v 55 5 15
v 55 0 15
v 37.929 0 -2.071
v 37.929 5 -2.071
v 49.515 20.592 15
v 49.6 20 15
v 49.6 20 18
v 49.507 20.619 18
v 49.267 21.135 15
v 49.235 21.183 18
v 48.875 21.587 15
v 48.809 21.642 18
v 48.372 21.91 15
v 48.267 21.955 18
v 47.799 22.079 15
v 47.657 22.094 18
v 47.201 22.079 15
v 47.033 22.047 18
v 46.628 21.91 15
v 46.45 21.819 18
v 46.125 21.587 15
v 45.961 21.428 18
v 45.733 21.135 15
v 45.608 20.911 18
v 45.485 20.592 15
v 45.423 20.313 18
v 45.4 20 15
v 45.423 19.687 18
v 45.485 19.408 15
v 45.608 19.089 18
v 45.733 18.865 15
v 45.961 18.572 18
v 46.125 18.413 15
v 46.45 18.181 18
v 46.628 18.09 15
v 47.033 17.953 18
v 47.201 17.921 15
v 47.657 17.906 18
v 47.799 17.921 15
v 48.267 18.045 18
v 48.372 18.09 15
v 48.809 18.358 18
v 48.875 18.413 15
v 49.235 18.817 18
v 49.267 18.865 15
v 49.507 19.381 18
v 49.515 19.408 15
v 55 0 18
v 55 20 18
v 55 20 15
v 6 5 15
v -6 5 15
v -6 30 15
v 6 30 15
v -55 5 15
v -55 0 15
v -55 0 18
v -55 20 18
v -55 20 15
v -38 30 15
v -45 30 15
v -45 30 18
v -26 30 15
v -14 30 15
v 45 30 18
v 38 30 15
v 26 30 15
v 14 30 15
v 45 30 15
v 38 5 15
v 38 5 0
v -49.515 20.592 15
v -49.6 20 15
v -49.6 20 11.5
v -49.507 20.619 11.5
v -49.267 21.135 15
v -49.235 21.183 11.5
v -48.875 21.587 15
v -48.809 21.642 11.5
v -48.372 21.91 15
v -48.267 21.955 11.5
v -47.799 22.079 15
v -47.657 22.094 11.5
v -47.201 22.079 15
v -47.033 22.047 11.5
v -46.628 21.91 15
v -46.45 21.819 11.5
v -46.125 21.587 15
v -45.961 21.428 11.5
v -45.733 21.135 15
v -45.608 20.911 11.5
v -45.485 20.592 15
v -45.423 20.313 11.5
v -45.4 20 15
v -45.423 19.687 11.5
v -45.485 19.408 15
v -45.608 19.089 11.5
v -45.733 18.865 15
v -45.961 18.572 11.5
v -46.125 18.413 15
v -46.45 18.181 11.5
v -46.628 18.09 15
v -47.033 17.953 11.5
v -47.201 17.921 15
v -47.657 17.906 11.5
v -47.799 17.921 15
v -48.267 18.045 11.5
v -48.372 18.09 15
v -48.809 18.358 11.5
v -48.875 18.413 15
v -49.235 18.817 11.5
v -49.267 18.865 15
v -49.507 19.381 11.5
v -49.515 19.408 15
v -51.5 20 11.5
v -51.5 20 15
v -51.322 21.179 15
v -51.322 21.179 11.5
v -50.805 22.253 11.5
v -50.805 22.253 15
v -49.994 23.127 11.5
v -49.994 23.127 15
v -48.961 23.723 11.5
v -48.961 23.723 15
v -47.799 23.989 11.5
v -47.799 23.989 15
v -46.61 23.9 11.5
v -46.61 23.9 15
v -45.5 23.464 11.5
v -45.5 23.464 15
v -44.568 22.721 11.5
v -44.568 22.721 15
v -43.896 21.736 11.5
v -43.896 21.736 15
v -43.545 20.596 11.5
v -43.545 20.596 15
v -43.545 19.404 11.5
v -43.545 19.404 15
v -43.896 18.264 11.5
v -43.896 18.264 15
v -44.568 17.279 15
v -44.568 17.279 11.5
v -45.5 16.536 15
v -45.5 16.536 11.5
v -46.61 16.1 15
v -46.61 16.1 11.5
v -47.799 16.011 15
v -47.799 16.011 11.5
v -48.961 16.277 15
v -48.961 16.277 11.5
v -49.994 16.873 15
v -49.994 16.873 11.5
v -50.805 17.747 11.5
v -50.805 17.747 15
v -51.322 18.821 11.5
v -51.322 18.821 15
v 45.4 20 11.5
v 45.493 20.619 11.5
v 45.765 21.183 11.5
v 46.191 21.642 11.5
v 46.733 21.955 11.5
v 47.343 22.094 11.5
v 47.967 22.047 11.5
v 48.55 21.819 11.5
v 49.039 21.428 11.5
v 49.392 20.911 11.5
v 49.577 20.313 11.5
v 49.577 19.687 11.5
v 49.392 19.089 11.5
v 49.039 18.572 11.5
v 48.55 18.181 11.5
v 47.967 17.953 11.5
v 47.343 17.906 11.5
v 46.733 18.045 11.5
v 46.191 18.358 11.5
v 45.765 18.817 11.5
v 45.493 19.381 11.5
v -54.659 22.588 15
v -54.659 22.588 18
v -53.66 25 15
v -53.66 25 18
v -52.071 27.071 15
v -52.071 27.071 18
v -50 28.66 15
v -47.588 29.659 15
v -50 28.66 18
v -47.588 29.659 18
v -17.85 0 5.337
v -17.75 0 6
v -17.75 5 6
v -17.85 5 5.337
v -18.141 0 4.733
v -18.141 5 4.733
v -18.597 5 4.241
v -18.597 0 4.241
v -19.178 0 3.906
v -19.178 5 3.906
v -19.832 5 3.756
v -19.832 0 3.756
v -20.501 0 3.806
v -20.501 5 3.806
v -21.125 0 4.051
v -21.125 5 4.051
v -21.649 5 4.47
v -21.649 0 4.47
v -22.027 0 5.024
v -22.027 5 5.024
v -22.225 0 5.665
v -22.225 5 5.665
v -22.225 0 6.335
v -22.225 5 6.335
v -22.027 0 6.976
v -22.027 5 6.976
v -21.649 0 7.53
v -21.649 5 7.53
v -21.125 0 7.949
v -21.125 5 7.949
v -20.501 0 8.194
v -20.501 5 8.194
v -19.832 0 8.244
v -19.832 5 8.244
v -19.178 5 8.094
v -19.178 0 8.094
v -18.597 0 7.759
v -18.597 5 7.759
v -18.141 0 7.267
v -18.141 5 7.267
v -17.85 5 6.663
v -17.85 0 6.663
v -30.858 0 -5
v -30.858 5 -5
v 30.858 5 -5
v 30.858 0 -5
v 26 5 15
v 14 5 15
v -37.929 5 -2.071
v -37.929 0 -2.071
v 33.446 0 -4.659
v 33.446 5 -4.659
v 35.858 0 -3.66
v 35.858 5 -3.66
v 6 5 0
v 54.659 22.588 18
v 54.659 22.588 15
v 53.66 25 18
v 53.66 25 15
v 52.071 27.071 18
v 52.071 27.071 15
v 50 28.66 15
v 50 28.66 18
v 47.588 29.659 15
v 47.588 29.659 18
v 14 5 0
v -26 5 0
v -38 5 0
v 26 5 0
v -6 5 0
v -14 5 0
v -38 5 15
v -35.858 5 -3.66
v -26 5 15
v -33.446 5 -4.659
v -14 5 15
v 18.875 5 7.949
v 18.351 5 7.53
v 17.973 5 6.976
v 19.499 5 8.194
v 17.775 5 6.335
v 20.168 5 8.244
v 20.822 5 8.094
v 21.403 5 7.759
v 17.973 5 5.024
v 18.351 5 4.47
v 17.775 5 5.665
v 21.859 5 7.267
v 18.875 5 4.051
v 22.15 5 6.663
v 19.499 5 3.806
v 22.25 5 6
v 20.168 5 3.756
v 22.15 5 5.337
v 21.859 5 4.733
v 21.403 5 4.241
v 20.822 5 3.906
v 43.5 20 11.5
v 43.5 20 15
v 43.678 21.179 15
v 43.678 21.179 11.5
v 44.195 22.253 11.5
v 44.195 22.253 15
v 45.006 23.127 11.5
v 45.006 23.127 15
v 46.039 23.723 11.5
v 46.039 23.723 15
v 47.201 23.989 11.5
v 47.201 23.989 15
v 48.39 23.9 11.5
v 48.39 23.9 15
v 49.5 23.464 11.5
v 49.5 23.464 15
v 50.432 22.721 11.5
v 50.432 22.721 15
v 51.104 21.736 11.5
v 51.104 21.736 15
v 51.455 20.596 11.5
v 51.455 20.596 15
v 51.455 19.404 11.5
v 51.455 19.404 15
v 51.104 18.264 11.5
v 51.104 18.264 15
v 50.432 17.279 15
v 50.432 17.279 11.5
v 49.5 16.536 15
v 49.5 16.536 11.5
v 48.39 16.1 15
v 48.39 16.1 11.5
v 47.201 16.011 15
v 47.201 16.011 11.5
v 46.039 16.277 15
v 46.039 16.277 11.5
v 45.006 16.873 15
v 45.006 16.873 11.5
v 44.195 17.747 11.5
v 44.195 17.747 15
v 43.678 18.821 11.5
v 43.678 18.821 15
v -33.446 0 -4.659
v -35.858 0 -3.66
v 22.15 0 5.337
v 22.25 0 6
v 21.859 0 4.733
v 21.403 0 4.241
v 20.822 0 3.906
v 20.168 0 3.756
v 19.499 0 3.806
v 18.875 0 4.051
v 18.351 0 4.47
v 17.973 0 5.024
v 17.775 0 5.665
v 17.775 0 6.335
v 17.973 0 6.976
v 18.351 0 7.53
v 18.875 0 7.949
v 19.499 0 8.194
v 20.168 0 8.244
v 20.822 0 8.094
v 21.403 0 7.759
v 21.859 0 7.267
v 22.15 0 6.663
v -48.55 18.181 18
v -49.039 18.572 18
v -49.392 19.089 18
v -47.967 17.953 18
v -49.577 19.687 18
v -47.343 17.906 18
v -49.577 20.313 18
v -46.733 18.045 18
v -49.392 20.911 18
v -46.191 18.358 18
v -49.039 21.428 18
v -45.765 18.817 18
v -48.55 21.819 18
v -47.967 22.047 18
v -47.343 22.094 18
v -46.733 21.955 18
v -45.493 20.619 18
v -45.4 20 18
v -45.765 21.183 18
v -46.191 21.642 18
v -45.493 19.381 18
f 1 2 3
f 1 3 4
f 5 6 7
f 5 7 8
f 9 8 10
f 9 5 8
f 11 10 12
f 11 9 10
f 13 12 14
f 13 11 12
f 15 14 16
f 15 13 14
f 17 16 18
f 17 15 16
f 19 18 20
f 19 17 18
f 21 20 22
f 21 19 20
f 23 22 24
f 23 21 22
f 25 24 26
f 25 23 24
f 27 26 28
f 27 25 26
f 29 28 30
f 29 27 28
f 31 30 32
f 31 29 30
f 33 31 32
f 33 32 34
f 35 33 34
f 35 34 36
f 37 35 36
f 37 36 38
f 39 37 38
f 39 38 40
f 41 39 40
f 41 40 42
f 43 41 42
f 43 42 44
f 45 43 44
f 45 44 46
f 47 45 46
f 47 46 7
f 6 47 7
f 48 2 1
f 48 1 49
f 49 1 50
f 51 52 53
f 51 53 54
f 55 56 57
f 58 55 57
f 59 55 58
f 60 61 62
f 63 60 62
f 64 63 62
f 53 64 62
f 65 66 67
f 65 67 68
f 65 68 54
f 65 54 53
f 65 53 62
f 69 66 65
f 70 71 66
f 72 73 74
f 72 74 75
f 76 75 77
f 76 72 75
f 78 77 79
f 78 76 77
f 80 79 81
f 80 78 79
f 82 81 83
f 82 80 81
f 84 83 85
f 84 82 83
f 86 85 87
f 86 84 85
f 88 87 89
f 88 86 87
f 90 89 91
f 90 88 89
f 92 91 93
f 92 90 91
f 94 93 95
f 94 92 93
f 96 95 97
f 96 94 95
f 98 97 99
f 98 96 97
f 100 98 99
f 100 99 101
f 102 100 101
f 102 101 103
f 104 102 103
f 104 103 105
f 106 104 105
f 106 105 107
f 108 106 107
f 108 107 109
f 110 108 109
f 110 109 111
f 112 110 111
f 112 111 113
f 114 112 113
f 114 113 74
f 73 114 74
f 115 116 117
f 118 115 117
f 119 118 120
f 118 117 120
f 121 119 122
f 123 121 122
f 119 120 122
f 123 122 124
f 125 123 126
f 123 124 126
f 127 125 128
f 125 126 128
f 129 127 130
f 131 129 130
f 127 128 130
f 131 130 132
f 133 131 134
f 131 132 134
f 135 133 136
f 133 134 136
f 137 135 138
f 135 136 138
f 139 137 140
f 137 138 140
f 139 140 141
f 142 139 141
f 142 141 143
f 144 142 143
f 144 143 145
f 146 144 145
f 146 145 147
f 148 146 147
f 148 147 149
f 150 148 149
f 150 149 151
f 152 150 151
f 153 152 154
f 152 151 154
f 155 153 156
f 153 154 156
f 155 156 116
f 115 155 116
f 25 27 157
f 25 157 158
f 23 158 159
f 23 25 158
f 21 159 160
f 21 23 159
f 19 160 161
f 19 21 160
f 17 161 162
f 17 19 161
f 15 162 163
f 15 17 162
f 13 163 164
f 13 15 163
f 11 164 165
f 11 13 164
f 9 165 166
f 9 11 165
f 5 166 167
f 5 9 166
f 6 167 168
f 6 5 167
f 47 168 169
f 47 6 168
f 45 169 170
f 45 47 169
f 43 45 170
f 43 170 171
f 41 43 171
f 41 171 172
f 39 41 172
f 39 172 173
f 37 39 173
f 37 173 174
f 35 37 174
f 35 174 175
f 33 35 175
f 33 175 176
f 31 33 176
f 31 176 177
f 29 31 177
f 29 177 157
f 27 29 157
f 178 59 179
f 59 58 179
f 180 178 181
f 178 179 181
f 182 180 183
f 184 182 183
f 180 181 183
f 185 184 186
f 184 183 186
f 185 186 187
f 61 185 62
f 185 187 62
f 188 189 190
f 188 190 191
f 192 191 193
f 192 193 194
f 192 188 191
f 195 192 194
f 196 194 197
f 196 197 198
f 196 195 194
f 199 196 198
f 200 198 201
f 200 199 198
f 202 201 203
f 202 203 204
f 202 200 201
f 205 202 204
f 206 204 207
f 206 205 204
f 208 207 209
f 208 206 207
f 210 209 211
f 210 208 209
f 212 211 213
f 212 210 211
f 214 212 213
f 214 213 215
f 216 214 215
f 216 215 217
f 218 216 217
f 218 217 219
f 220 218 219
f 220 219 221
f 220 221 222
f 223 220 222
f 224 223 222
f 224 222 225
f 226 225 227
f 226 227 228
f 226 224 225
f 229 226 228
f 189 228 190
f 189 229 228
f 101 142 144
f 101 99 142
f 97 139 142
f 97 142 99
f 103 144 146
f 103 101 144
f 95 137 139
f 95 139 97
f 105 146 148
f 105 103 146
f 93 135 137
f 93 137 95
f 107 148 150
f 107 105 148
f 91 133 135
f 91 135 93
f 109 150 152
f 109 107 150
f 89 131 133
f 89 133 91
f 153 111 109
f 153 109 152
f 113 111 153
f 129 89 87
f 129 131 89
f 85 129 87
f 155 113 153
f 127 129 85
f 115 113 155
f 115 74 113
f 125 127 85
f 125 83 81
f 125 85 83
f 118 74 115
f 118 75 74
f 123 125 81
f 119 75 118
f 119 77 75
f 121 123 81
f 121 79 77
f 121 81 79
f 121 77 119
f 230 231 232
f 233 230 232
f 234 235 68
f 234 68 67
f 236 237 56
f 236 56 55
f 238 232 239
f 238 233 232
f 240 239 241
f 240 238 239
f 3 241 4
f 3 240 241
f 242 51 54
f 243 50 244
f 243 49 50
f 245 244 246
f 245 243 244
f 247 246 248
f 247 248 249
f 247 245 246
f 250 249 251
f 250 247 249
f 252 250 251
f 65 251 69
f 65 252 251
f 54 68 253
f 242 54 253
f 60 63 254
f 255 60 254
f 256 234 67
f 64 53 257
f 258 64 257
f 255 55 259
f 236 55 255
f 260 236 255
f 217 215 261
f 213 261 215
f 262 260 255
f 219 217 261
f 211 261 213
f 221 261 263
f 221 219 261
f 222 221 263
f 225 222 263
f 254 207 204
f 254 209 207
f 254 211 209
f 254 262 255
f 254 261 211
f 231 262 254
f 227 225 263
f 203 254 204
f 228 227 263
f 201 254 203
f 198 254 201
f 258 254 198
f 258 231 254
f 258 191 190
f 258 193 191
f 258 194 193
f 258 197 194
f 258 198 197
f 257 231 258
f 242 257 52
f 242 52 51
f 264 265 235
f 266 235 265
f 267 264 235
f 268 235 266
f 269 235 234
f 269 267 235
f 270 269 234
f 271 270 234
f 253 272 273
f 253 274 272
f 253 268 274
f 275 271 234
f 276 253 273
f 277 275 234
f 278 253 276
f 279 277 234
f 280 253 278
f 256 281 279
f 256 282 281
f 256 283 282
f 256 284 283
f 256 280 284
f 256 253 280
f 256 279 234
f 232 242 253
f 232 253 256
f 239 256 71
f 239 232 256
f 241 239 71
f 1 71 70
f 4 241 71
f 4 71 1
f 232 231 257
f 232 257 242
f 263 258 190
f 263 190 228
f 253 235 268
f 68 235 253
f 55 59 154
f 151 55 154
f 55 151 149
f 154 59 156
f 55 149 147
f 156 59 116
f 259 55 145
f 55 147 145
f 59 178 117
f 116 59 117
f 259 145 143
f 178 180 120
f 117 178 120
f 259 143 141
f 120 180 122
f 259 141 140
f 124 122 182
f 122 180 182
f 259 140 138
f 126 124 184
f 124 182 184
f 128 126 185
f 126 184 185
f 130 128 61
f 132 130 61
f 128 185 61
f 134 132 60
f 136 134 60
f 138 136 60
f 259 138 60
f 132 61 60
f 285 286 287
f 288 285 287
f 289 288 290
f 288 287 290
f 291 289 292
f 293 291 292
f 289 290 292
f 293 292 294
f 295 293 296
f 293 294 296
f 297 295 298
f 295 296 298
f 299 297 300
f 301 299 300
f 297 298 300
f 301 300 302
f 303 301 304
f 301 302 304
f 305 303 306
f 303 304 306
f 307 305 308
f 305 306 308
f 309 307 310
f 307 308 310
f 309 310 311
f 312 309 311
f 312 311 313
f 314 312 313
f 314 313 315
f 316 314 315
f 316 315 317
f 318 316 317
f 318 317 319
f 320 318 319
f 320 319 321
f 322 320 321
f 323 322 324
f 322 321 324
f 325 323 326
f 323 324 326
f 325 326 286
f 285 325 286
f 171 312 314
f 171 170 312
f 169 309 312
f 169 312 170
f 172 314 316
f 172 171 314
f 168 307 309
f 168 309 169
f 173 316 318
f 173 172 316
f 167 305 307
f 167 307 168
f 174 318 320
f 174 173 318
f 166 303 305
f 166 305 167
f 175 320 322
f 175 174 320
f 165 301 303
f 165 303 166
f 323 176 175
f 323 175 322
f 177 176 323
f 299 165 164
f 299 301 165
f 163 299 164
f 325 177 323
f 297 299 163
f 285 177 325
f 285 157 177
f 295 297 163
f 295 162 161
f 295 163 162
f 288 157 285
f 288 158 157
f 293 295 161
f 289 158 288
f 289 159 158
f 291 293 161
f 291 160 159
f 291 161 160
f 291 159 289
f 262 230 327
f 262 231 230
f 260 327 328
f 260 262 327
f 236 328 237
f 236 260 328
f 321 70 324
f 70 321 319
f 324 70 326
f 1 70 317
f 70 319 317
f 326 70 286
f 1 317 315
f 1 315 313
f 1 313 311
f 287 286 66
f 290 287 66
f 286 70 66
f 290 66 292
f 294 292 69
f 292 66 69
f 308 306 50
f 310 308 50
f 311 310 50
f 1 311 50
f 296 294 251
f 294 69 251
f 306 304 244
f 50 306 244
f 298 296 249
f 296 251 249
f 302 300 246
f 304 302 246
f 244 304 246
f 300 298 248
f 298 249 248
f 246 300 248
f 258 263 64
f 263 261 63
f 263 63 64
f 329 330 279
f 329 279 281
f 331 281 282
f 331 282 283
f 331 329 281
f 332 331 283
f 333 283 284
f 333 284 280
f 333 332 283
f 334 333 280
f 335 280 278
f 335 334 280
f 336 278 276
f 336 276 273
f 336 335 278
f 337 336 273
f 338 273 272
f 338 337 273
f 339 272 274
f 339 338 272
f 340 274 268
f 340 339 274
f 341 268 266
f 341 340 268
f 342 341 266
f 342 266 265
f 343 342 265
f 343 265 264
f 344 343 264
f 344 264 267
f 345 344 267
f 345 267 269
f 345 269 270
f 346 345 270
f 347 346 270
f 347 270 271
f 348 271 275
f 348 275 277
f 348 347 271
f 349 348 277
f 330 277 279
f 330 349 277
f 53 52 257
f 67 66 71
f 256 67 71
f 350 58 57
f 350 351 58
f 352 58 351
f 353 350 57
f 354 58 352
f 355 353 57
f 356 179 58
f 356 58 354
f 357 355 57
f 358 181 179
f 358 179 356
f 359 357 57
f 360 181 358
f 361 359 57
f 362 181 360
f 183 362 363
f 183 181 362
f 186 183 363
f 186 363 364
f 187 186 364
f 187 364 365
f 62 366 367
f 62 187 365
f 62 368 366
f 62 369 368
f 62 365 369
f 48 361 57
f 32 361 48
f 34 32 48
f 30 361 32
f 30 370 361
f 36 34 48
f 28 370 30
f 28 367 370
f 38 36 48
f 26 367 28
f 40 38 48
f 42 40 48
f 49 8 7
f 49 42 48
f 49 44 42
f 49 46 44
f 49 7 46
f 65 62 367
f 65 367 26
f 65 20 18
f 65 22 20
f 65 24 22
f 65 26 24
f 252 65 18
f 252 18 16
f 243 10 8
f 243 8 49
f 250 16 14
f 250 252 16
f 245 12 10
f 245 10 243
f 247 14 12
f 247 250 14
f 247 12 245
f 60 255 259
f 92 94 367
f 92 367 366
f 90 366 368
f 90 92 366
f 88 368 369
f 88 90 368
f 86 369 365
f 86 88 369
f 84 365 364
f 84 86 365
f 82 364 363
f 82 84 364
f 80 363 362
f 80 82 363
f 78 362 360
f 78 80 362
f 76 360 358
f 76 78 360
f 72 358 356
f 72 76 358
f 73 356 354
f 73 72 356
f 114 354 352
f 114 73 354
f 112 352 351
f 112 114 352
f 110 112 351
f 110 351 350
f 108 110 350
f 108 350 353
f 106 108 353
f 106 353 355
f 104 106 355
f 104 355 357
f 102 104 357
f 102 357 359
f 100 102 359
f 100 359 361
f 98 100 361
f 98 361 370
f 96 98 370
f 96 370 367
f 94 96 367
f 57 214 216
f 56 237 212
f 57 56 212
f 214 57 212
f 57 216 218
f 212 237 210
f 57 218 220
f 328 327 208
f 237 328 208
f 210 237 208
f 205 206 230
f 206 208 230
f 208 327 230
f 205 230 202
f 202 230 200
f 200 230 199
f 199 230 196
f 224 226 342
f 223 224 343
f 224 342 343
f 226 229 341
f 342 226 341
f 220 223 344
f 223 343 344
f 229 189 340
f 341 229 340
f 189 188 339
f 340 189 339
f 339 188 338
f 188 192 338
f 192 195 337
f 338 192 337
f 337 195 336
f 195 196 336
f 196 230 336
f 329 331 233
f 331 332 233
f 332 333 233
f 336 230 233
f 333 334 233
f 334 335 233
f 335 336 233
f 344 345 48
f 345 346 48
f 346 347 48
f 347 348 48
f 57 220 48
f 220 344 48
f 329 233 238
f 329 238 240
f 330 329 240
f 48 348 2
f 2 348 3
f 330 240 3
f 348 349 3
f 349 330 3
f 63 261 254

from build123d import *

# Parameters (mm, degrees)
SKETCH1_W            = 110
SKETCH1_H            = 30
SKETCH1_R            = 2.25
EXTRUDE_1_DEPTH      = 5
SKETCH_1_W           = 110
SKETCH_1_H           = 30
SKETCH_1_R           = 2.1
EXTRUDE_2_DEPTH      = 3
FILLET_2_R           = 10
CHAMFER1_SIZE        = 30
EXTRUDE_3_DEPTH      = 38
EXTRUDE_3_DEPTH_BACK = 38
SKETCH_3_W           = 12
SKETCH_3_H           = 15
CUT_EXTRUDE_1_DEPTH  = 26
SKETCH3_R            = 4
SKETCH3_R_2          = 2.1
BOSS_EXTRUDE1_DEPTH  = 3.5
SKETCH4_W            = 114.569016578
SKETCH4_H            = 20
CUT_EXTRUDE1_DEPTH   = 6
FILLET1_R            = 10


with BuildPart() as part:
    # Sketch1 → Бобышка-Вытянуть1 (new body)
    with BuildSketch(Plane(origin=(0, 0, 0), x_dir=(1, 0, 0), z_dir=(0, 1, 0))):
        Rectangle(SKETCH1_W, SKETCH1_H)
        with Locations((-20, -6)):
            Circle(SKETCH1_R, mode=Mode.SUBTRACT)
        with Locations((20, -6)):
            Circle(SKETCH1_R, mode=Mode.SUBTRACT)
    extrude(amount=EXTRUDE_1_DEPTH)

    # Эскиз1 → Бобышка-Вытянуть2 (add)
    with BuildSketch(Plane.XY.offset(15)):
        with Locations((0, 15)):
            Rectangle(SKETCH_1_W, SKETCH_1_H)
        with Locations((-47.5, 20)):
            Circle(SKETCH_1_R, mode=Mode.SUBTRACT)
        with Locations((47.5, 20)):
            Circle(SKETCH_1_R, mode=Mode.SUBTRACT)
    extrude(amount=EXTRUDE_2_DEPTH)

    # Скругление2
    fillet_2_edges = [part.edges().sort_by_distance(p)[0] for p in [
        (-55, 30, 16.5),
        (55, 30, 16.5),
    ]]
    fillet(fillet_2_edges, radius=FILLET_2_R)

    # Chamfer1
    chamfer1_edges = [part.edges().sort_by_distance(p)[0] for p in [
        (-55, 2.5, -15),
        (55, 2.5, -15),
    ]]
    chamfer(chamfer1_edges, length=CHAMFER1_SIZE)

    # Эскиз2 → Бобышка-Вытянуть3 (add, two sides)
    with BuildSketch(Plane(origin=(0, 0, 0), x_dir=(0, 0, -1), z_dir=(1, 0, 0))) as extrude_3_sk:
        Polygon((-15, 30), (0, 5), (-15, 5), align=None)
    extrude(amount=EXTRUDE_3_DEPTH)
    extrude(extrude_3_sk.sketch, amount=-EXTRUDE_3_DEPTH_BACK)

    # Эскиз3 → Вырез-Вытянуть1 (cut, through all)
    with BuildSketch(Plane(origin=(0, 5, 0), x_dir=(1, 0, 0), z_dir=(0, 1, 0))):
        with Locations((20, -7.5)):
            Rectangle(SKETCH_3_W, SKETCH_3_H)
        with Locations((-20, -7.5)):
            Rectangle(SKETCH_3_W, SKETCH_3_H)
        with Locations((0, -7.5)):
            Rectangle(SKETCH_3_W, SKETCH_3_H)
    extrude(amount=CUT_EXTRUDE_1_DEPTH, mode=Mode.SUBTRACT)

    # Sketch3 → Boss-Extrude1 (add)
    with BuildSketch(Plane(origin=(0, 0, 15), x_dir=(-1, 0, 0), z_dir=(0, 0, -1))):
        with Locations((-47.5, 20)):
            Circle(SKETCH3_R)
        with Locations((-47.5, 20)):
            Circle(SKETCH3_R_2, mode=Mode.SUBTRACT)
        with Locations((47.5, 20)):
            Circle(SKETCH3_R)
        with Locations((47.5, 20)):
            Circle(SKETCH3_R_2, mode=Mode.SUBTRACT)
    extrude(amount=BOSS_EXTRUDE1_DEPTH)

    # Sketch4 → Cut-Extrude1 (cut, through all)
    with BuildSketch(Plane(origin=(0, 5, 0), x_dir=(1, 0, 0), z_dir=(0, 1, 0))):
        with Locations((0, 15)):
            Rectangle(SKETCH4_W, SKETCH4_H)
    extrude(amount=-CUT_EXTRUDE1_DEPTH, mode=Mode.SUBTRACT)

    # Fillet1
    fillet1_edges = [part.edges().sort_by_distance(p)[0] for p in [
        (35, 2.5, -5),
        (-35, 2.5, -5),
    ]]
    fillet(fillet1_edges, radius=FILLET1_R)


solid = part.part
